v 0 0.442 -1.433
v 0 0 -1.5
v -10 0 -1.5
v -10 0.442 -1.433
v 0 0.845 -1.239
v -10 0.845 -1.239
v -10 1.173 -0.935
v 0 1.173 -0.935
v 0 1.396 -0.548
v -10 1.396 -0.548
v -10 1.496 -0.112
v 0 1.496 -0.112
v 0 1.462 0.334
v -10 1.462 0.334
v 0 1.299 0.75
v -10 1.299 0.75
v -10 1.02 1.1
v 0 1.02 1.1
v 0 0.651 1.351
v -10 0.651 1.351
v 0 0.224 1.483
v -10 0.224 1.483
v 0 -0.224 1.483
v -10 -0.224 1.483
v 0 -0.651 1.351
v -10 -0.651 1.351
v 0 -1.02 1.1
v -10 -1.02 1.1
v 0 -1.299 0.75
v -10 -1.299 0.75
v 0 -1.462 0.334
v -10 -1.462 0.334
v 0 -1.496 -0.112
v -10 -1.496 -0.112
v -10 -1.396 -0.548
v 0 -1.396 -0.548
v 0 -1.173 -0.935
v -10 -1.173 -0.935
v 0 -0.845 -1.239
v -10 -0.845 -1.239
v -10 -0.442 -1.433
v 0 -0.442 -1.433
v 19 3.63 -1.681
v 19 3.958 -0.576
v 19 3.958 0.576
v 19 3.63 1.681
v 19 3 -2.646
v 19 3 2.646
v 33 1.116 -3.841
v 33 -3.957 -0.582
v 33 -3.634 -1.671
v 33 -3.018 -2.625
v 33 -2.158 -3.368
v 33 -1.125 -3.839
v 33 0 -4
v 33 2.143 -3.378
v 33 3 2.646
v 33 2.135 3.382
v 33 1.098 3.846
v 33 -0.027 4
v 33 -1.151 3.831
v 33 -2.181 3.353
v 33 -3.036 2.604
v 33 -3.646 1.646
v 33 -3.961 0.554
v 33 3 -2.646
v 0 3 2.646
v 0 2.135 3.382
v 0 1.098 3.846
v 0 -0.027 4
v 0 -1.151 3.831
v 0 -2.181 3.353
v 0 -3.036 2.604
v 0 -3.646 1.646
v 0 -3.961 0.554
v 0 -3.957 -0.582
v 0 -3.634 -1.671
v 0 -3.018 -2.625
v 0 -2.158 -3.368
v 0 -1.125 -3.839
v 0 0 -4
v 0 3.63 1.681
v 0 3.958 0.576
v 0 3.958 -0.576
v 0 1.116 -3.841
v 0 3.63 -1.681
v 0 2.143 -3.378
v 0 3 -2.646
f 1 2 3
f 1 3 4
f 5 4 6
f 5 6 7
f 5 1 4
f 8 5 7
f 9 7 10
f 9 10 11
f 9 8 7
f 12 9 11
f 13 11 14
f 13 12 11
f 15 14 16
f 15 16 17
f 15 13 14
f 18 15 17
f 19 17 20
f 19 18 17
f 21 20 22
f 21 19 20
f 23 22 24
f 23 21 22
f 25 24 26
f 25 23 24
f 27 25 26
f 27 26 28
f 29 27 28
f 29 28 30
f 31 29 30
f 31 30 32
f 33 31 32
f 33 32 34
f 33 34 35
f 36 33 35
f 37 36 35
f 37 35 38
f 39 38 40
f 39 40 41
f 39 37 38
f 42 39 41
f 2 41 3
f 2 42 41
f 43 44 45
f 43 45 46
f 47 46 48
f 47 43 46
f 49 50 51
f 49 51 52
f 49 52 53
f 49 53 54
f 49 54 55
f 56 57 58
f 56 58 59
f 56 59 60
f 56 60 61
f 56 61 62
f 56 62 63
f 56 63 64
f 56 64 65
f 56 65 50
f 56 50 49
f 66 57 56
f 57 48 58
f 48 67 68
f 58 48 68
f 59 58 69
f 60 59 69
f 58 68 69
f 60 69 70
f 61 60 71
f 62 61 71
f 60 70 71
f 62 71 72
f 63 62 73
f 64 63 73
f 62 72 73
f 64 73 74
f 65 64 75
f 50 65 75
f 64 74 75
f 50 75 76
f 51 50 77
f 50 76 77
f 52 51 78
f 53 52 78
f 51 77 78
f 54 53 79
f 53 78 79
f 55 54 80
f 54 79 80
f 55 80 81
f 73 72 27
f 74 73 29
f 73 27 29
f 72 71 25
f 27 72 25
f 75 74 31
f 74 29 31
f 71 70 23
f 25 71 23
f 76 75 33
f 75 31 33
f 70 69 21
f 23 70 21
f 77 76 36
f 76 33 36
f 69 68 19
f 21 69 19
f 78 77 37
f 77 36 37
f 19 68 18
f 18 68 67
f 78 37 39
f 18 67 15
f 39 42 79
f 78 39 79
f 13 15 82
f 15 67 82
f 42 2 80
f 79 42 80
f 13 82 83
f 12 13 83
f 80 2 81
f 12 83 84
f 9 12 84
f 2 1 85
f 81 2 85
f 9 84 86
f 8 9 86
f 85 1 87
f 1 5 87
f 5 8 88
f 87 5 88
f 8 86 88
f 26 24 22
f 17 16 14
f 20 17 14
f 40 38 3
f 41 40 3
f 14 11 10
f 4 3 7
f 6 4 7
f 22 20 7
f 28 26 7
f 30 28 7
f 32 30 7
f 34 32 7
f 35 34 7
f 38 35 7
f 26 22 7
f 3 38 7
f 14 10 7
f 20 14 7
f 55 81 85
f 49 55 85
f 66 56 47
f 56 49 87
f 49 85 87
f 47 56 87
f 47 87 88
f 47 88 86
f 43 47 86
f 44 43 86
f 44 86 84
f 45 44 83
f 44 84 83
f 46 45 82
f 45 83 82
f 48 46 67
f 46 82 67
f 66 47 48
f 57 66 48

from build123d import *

# Parameters (mm, degrees)
SKETCH1_R           = 1.5
BOSS_EXTRUDE1_DEPTH = 10
BOSS_EXTRUDE2_DEPTH = 33
BOSS_EXTRUDE3_DEPTH = 19


with BuildPart() as part:
    # Sketch1 → Boss-Extrude1 (new body)
    with BuildSketch(Plane(origin=(0, 0, 0), x_dir=(0, 0, -1), z_dir=(1, 0, 0))):
        Circle(SKETCH1_R)
    extrude(amount=-BOSS_EXTRUDE1_DEPTH)

    # Sketch1<3> → Boss-Extrude2 (add)
    with BuildSketch(Plane(origin=(0, 0, 0), x_dir=(0, 0, -1), z_dir=(1, 0, 0))):
        with BuildLine():
            Line((2.645751311, 3), (-2.645751311, 3))
            ThreePointArc((-2.645751311, 3), (0, -4), (2.645751311, 3))
        make_face()
    extrude(amount=BOSS_EXTRUDE2_DEPTH)

    # Sketch1<4> → Boss-Extrude3 (add)
    with BuildSketch(Plane(origin=(0, 0, 0), x_dir=(0, 0, -1), z_dir=(1, 0, 0))):
        with BuildLine():
            Line((-2.645751311, 3), (2.645751311, 3))
            ThreePointArc((2.645751311, 3), (0, 4), (-2.645751311, 3))
        make_face()
    extrude(amount=BOSS_EXTRUDE3_DEPTH)


solid = part.part
